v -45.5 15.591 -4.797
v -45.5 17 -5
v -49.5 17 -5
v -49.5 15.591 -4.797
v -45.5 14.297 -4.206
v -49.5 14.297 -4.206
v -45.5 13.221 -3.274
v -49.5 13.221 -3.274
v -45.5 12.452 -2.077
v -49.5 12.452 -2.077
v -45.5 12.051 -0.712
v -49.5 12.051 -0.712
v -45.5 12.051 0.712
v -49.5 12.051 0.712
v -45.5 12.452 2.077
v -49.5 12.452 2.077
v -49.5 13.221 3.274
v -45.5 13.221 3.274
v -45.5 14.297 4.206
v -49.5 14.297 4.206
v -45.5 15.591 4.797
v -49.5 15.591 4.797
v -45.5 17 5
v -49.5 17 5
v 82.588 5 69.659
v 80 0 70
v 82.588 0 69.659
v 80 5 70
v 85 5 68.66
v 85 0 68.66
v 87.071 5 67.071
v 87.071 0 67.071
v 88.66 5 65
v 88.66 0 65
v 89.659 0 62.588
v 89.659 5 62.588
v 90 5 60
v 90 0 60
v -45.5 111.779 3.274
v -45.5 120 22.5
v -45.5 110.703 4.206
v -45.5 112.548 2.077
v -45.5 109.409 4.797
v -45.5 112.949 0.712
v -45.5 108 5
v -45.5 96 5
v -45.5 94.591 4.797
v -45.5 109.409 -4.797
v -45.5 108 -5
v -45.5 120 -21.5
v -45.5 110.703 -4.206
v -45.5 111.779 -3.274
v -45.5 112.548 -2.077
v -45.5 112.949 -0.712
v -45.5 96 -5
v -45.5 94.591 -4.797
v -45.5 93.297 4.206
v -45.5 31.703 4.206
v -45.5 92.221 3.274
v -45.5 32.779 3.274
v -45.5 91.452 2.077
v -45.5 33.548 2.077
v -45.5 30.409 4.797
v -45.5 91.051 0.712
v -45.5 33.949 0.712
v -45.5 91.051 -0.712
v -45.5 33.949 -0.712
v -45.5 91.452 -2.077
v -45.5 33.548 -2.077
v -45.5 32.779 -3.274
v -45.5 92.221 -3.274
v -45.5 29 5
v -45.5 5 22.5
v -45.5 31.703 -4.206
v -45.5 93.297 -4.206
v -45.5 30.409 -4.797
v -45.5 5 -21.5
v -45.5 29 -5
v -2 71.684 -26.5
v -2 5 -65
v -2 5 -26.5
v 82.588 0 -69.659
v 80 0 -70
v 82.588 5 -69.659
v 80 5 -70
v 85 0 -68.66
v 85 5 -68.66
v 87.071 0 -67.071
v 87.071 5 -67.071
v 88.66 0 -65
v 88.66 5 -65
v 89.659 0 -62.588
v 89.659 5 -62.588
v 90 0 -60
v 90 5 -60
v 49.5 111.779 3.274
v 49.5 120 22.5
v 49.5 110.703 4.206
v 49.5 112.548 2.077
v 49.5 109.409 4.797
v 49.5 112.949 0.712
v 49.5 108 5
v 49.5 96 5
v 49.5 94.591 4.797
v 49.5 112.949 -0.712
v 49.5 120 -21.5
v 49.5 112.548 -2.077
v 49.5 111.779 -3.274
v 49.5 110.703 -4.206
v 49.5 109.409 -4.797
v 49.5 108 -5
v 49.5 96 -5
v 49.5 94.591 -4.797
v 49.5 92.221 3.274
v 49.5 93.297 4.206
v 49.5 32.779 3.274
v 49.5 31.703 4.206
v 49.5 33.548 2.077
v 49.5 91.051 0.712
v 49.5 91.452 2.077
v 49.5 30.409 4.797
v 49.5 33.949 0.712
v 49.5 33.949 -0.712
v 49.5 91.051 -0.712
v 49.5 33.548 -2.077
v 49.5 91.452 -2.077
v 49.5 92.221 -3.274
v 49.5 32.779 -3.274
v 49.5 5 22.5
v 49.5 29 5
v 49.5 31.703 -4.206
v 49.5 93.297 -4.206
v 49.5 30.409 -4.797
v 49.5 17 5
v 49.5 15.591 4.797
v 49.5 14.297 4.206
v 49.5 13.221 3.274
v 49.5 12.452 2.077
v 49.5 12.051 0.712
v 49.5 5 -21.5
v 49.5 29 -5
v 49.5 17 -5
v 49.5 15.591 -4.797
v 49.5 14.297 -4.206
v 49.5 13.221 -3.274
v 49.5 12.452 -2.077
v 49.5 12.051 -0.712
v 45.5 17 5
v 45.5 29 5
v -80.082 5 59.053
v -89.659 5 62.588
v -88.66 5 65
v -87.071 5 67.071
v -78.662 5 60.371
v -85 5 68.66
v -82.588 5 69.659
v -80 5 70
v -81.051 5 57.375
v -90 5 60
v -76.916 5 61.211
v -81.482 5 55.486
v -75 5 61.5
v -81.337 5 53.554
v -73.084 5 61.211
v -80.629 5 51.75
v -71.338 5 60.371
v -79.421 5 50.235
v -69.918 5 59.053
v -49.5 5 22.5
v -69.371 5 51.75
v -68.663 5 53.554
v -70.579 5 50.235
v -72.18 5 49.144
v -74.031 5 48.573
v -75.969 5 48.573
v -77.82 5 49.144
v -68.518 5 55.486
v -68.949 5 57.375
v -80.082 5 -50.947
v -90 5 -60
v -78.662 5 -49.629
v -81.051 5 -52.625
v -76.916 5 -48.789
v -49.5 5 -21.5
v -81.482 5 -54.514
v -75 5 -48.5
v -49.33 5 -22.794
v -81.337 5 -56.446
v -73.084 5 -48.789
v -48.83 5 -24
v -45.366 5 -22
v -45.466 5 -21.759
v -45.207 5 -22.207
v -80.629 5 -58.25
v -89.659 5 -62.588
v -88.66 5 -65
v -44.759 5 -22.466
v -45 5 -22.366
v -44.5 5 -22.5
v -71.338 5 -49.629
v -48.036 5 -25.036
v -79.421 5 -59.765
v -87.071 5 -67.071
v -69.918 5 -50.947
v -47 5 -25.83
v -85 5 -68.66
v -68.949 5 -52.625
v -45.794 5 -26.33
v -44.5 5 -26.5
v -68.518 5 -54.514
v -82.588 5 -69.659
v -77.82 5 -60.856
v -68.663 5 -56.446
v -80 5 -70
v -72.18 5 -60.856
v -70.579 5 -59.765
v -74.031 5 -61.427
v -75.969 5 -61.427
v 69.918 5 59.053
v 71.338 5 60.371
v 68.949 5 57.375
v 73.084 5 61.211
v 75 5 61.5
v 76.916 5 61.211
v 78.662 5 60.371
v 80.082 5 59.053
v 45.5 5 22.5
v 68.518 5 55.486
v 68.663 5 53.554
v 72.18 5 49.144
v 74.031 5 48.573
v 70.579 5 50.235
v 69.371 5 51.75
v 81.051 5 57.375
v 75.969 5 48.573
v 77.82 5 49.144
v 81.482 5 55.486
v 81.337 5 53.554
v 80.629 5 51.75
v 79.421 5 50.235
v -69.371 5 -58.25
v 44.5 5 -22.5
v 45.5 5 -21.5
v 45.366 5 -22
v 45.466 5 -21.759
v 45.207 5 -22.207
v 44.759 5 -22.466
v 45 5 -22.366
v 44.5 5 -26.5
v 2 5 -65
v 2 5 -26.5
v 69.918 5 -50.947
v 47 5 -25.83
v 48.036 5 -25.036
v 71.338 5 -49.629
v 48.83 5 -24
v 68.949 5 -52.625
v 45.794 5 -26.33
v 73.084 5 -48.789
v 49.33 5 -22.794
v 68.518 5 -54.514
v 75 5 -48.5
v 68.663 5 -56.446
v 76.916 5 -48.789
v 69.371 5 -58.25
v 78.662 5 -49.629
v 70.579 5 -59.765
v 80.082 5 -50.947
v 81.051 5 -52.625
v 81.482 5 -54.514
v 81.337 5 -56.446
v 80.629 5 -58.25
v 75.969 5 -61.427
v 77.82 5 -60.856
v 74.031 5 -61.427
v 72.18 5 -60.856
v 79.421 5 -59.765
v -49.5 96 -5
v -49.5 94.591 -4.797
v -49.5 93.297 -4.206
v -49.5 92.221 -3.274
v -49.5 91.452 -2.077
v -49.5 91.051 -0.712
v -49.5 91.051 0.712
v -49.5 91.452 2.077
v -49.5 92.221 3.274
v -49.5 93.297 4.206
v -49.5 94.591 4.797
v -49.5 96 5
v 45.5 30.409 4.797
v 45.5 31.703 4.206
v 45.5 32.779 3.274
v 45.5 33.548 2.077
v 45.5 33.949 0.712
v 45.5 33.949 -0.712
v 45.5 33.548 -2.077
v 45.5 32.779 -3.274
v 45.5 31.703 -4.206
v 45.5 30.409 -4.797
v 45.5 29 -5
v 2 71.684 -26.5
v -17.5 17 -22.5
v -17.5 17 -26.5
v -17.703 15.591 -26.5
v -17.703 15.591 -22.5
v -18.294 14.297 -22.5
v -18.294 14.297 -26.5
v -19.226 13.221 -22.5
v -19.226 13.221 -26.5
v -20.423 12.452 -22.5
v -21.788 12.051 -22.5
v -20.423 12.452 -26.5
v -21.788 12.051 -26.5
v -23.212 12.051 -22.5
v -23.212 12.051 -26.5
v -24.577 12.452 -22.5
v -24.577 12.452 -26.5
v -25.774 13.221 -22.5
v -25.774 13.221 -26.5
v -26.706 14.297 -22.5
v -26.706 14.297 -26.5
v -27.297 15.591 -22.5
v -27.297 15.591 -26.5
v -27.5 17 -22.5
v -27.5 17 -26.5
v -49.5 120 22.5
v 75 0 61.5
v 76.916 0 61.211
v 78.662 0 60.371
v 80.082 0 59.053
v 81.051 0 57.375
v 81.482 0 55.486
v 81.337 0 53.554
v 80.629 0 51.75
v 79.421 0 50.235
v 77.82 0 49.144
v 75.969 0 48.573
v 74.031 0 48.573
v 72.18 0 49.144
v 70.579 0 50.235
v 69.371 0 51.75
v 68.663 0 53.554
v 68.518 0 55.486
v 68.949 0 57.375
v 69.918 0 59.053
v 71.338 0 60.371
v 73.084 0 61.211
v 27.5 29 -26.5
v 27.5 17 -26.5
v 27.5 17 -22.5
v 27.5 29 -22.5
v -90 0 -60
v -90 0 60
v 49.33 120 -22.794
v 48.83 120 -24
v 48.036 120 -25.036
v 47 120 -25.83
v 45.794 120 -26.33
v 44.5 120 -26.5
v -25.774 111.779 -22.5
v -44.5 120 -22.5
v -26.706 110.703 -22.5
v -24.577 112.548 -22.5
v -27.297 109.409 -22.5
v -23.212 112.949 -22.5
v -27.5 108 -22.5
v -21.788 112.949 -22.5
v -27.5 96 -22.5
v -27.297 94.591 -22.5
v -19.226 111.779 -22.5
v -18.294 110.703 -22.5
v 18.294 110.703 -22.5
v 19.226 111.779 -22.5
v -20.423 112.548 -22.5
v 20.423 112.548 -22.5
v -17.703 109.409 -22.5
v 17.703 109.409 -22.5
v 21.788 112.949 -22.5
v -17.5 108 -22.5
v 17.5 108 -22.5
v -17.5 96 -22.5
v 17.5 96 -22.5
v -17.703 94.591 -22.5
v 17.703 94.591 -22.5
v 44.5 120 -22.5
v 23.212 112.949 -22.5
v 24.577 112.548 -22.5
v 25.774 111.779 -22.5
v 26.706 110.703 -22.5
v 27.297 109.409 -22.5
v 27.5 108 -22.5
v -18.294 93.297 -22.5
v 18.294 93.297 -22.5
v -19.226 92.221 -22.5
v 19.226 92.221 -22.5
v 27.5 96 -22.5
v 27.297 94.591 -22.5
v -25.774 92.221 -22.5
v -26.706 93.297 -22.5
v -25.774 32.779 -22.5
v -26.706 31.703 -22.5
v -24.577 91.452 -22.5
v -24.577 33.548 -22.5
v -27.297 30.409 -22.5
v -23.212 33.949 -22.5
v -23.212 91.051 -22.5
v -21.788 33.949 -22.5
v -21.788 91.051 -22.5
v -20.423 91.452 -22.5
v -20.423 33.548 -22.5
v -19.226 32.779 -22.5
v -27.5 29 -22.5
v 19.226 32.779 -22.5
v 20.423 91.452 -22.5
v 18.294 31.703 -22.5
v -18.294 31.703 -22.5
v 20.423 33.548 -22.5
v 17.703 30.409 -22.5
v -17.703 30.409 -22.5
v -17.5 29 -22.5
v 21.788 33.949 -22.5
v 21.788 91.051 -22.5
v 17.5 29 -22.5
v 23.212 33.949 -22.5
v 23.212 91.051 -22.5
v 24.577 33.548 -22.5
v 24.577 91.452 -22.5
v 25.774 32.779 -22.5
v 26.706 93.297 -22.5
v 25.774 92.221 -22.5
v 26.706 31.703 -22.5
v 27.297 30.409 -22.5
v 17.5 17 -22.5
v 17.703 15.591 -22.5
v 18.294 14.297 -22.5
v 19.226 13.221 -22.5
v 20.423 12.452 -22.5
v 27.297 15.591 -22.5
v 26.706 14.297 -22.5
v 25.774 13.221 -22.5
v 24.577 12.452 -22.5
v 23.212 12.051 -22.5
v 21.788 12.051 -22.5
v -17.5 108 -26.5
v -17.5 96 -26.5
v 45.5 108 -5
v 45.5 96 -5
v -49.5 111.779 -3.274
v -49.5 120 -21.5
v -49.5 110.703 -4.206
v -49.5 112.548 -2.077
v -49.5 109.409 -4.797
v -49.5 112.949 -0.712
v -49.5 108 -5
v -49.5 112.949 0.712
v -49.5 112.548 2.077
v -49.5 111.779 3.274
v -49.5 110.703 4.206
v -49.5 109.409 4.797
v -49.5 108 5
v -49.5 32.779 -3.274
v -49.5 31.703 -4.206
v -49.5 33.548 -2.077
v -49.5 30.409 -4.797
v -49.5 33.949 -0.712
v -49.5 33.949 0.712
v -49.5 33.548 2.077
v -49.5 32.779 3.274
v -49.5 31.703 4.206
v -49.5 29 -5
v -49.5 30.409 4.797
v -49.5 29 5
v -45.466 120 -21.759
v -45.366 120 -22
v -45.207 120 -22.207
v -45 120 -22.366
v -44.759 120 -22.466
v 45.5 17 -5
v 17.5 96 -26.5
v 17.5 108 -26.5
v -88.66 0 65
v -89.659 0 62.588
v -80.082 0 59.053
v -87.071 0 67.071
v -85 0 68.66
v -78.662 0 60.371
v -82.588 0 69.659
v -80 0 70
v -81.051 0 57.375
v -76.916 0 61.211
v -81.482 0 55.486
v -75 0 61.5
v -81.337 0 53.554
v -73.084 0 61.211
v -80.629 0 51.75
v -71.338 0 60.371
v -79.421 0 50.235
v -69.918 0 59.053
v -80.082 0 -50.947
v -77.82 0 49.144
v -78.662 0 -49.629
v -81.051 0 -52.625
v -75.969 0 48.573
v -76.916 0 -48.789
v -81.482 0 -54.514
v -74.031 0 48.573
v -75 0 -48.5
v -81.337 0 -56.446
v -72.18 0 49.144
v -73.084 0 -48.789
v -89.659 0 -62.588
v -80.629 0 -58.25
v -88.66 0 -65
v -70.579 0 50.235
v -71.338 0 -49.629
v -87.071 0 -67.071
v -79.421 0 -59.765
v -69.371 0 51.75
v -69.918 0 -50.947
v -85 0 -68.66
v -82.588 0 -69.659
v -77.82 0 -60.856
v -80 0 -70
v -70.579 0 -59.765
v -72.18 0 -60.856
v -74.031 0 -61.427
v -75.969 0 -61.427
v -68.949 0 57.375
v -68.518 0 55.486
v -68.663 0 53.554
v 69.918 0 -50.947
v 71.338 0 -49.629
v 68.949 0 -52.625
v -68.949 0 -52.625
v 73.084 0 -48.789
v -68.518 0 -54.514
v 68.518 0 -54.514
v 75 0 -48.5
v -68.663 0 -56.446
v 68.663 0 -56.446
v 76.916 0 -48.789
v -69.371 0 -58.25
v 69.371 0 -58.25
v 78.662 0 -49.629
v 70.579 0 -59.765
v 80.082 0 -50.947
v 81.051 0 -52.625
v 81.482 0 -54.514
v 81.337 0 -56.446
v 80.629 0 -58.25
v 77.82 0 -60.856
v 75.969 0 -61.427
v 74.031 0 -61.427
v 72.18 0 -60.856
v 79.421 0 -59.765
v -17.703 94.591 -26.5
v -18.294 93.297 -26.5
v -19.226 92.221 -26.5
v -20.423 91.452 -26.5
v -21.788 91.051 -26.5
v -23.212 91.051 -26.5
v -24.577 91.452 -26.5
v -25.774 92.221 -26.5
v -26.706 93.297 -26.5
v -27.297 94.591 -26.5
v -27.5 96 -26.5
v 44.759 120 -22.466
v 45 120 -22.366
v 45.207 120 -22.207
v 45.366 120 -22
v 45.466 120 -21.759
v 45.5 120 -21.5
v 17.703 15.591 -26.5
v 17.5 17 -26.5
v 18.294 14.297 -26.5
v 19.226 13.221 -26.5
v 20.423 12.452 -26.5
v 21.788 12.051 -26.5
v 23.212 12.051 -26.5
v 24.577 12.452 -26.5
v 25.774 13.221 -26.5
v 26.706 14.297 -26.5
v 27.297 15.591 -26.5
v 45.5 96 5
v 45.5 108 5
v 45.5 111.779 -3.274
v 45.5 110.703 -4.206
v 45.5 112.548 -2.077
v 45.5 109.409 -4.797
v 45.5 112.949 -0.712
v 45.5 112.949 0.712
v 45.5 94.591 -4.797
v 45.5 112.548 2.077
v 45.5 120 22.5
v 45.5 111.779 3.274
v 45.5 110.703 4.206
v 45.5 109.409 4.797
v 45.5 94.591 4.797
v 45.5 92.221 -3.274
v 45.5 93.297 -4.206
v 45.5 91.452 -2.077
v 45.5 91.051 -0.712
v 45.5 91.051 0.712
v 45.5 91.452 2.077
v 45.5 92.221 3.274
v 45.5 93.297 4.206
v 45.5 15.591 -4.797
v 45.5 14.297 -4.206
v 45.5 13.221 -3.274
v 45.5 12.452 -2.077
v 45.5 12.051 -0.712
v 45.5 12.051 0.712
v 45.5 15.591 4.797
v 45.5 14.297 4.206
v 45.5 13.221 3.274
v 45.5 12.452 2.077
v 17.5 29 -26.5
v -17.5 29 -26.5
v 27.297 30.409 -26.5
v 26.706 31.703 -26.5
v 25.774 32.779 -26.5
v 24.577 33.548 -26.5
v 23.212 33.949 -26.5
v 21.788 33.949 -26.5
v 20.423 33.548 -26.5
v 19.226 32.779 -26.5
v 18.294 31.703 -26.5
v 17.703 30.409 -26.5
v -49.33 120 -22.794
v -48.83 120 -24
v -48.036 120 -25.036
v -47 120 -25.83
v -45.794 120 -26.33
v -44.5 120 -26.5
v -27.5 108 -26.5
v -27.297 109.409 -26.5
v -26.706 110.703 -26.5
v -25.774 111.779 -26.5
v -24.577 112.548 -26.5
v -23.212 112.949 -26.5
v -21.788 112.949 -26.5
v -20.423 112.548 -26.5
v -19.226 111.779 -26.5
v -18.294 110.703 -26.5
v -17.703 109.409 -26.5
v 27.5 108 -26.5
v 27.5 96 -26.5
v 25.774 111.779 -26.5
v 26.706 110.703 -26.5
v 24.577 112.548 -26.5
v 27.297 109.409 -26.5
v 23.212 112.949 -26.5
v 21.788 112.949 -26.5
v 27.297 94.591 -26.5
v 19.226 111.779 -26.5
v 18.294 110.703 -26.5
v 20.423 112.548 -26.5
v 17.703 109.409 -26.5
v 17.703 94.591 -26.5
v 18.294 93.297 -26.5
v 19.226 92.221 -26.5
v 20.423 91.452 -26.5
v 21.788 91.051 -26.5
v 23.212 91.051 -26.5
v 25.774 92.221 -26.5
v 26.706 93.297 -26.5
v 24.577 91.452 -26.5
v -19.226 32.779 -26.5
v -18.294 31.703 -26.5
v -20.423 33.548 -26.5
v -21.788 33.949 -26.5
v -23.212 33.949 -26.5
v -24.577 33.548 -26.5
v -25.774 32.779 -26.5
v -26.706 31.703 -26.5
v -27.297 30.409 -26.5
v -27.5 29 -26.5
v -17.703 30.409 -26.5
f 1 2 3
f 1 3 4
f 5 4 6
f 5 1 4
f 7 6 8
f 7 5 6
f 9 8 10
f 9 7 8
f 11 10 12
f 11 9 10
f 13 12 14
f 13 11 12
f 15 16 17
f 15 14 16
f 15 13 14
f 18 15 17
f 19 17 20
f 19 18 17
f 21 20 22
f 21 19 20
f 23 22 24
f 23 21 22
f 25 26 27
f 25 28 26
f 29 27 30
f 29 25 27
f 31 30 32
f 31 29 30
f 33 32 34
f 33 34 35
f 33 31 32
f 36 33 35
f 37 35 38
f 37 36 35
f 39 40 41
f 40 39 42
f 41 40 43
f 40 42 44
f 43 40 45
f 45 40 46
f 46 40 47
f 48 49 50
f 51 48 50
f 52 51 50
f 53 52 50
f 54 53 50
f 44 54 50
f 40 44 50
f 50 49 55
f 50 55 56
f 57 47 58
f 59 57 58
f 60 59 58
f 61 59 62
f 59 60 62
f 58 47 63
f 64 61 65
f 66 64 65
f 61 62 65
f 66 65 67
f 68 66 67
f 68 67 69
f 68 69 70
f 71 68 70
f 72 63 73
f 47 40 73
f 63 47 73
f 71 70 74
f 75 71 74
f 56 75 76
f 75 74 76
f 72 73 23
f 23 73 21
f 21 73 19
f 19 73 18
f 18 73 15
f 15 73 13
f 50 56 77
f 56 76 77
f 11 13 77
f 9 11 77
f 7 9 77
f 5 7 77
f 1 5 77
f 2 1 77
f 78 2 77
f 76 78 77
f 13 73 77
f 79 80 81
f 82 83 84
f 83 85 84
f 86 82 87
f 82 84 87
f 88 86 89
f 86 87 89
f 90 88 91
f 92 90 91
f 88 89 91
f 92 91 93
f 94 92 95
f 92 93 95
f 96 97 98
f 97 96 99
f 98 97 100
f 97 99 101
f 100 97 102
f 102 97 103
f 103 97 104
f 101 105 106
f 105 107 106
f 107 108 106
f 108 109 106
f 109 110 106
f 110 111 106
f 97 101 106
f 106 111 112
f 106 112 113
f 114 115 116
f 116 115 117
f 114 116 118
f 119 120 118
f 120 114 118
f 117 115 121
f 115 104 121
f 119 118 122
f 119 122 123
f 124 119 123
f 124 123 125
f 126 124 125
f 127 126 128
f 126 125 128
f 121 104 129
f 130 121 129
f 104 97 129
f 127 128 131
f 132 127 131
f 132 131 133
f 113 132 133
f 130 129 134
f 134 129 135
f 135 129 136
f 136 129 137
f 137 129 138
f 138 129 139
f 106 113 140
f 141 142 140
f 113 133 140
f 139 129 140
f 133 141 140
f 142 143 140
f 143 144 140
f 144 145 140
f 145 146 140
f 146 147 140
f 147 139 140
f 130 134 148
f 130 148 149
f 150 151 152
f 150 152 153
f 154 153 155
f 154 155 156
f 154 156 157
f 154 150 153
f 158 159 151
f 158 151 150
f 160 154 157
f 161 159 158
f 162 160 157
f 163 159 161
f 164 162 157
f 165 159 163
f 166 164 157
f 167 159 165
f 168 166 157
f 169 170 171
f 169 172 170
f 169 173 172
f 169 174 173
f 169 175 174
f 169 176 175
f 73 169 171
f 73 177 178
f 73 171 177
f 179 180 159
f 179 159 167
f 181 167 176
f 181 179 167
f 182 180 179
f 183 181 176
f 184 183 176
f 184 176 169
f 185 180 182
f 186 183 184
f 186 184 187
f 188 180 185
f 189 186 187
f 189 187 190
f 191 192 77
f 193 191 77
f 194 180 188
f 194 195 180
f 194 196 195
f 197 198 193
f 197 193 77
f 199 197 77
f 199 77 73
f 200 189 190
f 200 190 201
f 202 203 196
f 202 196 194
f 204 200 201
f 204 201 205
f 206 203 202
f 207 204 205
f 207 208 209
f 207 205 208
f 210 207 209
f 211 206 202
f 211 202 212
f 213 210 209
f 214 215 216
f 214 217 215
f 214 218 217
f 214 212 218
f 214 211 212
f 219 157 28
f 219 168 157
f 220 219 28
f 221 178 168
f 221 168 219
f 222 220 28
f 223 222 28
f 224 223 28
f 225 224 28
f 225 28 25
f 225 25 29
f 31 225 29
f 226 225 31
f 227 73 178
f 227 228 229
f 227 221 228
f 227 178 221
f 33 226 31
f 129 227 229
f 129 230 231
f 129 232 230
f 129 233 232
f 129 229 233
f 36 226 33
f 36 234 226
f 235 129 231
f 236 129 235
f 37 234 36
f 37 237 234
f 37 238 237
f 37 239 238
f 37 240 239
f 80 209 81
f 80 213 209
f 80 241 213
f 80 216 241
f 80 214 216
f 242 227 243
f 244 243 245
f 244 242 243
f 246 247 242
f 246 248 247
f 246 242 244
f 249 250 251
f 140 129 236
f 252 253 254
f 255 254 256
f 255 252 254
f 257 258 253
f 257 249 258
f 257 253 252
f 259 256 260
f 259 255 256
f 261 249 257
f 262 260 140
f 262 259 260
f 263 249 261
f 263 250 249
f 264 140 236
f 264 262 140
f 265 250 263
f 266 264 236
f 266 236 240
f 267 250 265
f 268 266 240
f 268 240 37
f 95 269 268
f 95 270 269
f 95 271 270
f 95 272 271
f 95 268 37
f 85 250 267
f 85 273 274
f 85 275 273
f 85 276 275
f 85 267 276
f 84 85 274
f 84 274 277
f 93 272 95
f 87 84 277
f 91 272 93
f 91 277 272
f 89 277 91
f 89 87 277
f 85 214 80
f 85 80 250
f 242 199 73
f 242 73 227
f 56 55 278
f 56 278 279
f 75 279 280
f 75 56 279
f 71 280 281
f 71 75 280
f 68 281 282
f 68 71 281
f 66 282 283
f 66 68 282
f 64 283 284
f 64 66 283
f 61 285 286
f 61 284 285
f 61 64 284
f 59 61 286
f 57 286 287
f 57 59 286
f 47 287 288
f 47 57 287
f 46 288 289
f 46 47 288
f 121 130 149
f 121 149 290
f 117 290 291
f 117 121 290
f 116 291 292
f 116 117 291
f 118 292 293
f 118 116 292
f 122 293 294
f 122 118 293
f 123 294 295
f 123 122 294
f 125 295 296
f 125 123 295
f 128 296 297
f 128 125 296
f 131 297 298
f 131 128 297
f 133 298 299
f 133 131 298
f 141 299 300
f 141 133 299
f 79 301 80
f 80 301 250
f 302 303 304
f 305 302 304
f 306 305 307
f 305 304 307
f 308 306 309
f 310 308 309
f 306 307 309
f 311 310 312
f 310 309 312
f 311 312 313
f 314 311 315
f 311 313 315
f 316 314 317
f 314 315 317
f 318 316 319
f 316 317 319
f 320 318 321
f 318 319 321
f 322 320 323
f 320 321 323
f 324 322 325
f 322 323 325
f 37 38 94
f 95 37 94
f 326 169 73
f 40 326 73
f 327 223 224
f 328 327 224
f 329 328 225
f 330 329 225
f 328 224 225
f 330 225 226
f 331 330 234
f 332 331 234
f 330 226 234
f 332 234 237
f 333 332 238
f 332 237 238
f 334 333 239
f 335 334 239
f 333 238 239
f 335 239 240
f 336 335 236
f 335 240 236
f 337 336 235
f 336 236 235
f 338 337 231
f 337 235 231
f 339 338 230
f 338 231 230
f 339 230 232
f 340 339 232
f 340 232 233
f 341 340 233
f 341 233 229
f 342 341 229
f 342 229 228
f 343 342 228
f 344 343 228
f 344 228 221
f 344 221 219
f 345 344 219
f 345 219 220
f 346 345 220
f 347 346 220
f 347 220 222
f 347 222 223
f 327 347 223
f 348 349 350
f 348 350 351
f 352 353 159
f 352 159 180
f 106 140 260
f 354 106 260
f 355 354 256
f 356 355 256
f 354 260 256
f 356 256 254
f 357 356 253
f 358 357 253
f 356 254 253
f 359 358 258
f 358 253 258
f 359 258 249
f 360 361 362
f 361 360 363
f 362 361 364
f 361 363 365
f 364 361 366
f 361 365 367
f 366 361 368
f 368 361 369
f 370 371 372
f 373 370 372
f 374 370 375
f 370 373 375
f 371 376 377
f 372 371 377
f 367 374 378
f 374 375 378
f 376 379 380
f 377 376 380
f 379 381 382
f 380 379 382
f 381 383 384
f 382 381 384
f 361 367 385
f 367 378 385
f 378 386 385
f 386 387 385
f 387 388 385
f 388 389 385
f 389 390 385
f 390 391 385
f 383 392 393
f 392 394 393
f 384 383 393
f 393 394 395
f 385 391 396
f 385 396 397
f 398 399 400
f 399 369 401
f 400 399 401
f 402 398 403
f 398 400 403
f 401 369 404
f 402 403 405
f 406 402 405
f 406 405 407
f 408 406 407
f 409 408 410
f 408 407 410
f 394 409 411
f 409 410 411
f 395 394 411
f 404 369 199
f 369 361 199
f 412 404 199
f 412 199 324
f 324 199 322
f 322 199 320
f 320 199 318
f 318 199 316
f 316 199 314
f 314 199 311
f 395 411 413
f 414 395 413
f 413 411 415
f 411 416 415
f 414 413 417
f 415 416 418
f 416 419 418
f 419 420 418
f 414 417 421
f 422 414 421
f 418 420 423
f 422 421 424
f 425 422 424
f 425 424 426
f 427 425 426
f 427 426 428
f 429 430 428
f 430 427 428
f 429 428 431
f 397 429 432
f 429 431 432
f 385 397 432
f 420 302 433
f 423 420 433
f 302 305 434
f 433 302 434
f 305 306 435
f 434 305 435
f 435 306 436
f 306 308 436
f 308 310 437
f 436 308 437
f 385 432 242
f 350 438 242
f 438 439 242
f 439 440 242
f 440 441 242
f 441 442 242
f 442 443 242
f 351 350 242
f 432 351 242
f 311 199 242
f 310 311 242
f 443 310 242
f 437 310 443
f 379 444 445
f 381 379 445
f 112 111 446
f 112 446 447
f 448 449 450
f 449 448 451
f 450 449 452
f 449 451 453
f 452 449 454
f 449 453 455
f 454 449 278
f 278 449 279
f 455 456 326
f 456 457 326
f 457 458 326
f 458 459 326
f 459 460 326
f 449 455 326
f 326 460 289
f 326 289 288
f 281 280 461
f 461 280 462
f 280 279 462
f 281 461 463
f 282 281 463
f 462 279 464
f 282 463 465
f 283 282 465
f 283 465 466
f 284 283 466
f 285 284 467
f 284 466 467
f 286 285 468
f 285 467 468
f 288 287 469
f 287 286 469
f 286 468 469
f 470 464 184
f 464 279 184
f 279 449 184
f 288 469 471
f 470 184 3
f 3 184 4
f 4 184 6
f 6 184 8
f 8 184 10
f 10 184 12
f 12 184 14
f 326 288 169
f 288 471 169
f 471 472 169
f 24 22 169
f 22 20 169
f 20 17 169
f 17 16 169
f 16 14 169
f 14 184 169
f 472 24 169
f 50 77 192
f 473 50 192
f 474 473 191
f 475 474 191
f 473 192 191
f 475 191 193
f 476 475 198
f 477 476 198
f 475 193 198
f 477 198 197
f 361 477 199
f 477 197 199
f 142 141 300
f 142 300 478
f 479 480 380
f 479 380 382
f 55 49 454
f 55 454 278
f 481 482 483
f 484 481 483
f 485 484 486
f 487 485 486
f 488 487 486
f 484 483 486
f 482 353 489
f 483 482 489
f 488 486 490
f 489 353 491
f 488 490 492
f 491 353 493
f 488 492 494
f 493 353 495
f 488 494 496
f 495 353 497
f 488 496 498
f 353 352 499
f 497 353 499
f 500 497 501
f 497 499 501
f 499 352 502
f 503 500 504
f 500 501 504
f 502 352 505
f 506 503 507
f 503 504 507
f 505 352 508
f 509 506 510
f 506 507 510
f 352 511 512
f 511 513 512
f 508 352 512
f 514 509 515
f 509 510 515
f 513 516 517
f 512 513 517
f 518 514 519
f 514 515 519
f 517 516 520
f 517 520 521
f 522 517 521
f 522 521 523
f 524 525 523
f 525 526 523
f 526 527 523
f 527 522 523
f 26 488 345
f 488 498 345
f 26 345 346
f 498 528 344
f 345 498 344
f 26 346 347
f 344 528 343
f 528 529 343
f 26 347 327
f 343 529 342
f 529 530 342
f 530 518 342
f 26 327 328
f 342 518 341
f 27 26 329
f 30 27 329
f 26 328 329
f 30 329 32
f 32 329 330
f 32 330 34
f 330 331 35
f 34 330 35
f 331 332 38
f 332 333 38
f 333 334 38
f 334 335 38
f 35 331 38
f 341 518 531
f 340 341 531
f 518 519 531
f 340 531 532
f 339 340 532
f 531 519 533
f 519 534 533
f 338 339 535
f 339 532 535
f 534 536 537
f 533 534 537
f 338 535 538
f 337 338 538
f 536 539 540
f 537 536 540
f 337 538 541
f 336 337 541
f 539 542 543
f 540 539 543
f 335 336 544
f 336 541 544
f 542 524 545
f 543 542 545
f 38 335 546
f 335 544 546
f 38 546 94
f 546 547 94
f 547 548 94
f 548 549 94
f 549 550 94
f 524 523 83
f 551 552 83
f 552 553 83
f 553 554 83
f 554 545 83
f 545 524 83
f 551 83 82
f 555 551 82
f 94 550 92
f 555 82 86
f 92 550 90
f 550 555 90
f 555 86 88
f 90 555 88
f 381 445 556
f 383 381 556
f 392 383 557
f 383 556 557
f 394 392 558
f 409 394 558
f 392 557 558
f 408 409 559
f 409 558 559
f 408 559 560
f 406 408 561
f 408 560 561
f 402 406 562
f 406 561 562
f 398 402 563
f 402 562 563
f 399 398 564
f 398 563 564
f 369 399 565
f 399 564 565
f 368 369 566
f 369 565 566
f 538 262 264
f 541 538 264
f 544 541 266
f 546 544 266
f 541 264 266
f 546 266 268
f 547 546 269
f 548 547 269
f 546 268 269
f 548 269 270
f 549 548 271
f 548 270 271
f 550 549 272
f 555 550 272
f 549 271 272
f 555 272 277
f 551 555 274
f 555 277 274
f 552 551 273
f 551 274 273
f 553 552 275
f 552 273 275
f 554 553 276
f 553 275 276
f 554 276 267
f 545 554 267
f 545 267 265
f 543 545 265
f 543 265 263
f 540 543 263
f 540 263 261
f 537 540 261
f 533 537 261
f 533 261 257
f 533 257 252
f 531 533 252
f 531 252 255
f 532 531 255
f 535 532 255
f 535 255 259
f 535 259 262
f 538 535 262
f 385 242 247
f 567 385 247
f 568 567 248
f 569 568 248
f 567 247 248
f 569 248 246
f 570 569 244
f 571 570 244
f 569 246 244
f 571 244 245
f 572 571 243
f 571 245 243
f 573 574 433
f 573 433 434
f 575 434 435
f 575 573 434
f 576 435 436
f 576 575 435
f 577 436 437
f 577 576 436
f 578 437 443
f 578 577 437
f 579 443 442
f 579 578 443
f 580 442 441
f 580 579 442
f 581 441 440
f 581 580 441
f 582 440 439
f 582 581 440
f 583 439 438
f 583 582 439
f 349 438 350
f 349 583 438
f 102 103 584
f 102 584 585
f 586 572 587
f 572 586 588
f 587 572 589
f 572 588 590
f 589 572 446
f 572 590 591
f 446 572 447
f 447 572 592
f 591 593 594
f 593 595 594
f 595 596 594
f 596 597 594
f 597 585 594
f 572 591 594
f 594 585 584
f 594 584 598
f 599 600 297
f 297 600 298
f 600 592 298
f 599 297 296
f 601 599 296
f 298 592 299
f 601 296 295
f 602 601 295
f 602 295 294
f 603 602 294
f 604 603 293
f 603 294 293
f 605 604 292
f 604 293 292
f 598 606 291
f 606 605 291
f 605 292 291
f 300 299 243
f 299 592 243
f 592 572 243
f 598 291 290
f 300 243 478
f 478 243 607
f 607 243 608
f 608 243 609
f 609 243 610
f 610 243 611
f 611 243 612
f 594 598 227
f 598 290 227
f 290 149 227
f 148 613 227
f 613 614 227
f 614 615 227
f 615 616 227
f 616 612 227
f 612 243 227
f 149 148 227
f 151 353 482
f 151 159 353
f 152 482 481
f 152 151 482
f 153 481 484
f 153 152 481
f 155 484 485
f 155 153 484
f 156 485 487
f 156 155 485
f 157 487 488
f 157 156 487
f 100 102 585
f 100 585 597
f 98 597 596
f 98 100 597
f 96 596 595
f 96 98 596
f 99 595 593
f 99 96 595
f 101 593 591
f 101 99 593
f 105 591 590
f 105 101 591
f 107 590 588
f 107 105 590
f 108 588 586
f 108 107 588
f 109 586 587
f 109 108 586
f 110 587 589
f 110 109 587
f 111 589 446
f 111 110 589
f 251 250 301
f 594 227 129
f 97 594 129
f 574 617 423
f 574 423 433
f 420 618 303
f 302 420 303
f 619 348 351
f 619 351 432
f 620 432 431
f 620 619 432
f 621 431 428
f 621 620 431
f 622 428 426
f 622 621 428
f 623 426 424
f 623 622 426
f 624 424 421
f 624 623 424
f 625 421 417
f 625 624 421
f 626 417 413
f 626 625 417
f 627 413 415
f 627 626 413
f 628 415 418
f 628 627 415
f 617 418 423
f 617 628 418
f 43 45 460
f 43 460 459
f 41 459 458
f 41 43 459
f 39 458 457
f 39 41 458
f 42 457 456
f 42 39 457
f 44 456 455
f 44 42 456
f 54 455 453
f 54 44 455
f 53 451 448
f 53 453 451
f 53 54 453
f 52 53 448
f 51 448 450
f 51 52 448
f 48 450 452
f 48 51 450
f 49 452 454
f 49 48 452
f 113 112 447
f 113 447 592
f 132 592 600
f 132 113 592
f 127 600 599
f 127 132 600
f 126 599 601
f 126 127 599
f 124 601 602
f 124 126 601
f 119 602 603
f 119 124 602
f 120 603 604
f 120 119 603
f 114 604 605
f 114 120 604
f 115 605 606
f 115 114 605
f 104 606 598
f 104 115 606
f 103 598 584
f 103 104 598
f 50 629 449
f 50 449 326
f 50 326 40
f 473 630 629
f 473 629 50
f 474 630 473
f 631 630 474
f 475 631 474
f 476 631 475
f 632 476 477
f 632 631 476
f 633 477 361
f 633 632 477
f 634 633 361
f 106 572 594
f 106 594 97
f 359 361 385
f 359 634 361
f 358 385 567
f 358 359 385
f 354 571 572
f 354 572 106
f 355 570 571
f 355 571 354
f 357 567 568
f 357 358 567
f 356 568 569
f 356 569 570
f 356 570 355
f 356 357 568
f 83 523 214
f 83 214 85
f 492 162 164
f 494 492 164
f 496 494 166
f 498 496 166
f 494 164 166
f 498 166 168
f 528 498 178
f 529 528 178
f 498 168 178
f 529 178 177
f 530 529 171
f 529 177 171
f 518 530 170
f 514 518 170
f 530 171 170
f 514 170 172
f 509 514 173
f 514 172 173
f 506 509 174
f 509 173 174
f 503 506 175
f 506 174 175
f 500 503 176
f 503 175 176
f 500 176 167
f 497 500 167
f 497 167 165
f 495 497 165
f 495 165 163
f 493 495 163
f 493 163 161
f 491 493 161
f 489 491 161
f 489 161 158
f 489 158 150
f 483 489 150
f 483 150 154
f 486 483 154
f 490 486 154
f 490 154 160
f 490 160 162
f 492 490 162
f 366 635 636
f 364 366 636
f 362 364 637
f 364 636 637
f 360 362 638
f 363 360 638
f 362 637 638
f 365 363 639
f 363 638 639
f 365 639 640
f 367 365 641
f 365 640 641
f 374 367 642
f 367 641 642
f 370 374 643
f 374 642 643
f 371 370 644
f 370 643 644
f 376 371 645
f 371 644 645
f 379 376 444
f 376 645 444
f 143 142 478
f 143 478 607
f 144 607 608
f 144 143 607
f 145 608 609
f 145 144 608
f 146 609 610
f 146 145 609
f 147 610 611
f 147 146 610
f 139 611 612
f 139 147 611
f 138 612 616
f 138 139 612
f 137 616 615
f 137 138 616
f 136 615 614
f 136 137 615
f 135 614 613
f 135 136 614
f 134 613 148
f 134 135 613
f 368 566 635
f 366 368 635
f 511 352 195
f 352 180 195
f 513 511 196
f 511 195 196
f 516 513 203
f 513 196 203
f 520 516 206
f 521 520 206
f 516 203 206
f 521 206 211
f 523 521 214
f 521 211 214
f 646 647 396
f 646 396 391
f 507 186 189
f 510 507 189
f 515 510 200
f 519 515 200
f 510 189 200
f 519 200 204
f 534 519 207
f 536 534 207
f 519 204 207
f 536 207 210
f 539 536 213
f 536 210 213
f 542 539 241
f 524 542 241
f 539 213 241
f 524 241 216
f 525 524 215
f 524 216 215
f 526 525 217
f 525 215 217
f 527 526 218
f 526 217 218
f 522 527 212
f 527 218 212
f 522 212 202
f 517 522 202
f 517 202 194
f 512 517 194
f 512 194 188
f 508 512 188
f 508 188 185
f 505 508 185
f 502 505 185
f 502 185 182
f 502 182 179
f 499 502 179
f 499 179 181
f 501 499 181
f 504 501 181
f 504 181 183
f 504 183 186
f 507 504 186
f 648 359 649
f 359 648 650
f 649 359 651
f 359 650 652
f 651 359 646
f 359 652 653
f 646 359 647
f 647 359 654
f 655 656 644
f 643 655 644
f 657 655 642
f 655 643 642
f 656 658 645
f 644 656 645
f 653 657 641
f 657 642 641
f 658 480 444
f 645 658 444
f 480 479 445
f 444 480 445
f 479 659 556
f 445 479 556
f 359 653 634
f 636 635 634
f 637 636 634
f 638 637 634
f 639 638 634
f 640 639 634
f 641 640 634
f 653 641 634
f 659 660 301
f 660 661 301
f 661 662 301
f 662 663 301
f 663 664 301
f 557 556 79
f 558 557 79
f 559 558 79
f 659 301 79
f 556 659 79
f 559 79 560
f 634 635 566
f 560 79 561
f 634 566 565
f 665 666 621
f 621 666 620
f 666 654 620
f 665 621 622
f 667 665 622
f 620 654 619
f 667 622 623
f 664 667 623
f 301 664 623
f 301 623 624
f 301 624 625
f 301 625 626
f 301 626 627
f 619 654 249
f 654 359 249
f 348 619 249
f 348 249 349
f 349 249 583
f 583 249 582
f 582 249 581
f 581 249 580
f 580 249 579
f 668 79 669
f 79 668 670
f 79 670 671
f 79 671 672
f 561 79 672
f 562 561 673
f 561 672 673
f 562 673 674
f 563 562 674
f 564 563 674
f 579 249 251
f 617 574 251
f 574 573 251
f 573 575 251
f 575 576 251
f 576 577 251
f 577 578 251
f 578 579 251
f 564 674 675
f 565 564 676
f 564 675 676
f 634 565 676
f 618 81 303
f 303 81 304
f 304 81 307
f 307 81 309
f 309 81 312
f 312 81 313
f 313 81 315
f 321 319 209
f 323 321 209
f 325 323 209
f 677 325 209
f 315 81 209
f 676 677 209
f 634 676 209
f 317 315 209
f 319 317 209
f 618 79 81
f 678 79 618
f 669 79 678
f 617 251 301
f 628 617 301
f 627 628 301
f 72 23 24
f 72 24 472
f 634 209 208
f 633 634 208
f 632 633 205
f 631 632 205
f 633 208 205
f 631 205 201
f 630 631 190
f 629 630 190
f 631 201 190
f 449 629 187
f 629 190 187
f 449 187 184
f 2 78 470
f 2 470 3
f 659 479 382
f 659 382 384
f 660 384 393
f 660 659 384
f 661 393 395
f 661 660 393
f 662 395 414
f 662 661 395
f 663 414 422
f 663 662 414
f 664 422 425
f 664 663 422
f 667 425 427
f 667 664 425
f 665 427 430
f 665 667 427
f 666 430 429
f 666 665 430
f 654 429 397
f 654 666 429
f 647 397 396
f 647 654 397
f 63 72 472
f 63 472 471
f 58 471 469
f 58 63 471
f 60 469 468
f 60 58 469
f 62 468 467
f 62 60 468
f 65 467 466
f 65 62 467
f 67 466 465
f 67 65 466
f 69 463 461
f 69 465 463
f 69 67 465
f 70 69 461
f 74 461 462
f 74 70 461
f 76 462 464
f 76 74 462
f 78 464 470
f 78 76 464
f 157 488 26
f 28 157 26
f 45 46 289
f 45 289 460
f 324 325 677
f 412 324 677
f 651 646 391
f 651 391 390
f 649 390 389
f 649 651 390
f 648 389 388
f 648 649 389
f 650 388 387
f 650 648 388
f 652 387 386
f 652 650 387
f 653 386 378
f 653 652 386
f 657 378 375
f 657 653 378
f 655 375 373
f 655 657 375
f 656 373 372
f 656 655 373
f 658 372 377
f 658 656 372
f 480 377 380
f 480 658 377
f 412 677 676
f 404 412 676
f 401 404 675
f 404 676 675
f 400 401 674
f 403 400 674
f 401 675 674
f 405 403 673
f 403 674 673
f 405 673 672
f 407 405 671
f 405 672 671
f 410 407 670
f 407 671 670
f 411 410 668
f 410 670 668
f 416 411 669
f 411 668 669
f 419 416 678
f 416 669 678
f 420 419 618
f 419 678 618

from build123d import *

# Parameters (mm, degrees)
SKETCH_2_W          = 180
SKETCH_2_H          = 140
EXTRUDE_1_DEPTH     = 5
EXTRUDE_1_2_DEPTH   = 115
EXTRUDE_2_DEPTH     = 2
CUT_EXTRUDE_1_DEPTH = 140.5
SKETCH_6_R          = 6.5
CUT_EXTRUDE_2_DEPTH = 6
FILLET_1_R          = 10
CUT_EXTRUDE_3_REACH = 98.5


with BuildPart() as part:
    # Эскиз2 → Extrude 1 (new body)
    with BuildSketch(Plane(origin=(0, 0, 0), x_dir=(1, 0, 0), z_dir=(0, 1, 0))):
        Rectangle(SKETCH_2_W, SKETCH_2_H)
    extrude(amount=EXTRUDE_1_DEPTH)

    # Эскиз3 → Extrude 1 2 (add)
    with BuildSketch(Plane(origin=(0, 5, 0), x_dir=(1, 0, 0), z_dir=(0, 1, 0))):
        with BuildLine():
            Line((-45.5, -22.5), (-45.5, 21.5))
            ThreePointArc((-45.5, 21.5), (-45.207106781, 22.207106781), (-44.5, 22.5))
            Line((-44.5, 22.5), (44.5, 22.5))
            ThreePointArc((44.5, 22.5), (45.207106781, 22.207106781), (45.5, 21.5))
            Line((45.5, 21.5), (45.5, -22.5))
            Line((45.5, -22.5), (49.5, -22.5))
            Line((49.5, -22.5), (49.5, 21.5))
            ThreePointArc((49.5, 21.5), (48.035533906, 25.035533906), (44.5, 26.5))
            Line((44.5, 26.5), (-44.5, 26.5))
            ThreePointArc((-44.5, 26.5), (-48.035533906, 25.035533906), (-49.5, 21.5))
            Line((-49.5, 21.5), (-49.5, -22.5))
            Line((-49.5, -22.5), (-45.5, -22.5))
        make_face()
    extrude(amount=EXTRUDE_1_2_DEPTH)

    # Эскиз4 → Бобышка-Вытянуть2 (add, symmetric)
    with BuildSketch(Plane(origin=(0, 0, 0), x_dir=(0, 0, -1), z_dir=(1, 0, 0))):
        Polygon((26.5, 71.683956091), (65, 5), (26.5, 5), align=None)
    extrude(amount=EXTRUDE_2_DEPTH, both=True)

    # Эскиз5 → Вырез-Вытянуть1 (cut, through all)
    with BuildSketch(Plane(origin=(49.5, 0, 0), x_dir=(0, 0, -1), z_dir=(1, 0, 0))):
        with BuildLine():
            Line((5, 108), (5, 96))
            ThreePointArc((5, 96), (0, 91), (-5, 96))
            Line((-5, 96), (-5, 108))
            ThreePointArc((-5, 108), (0, 113), (5, 108))
        make_face()
        with BuildLine():
            Line((5, 29), (5, 17))
            ThreePointArc((5, 17), (0, 12), (-5, 17))
            Line((-5, 17), (-5, 29))
            ThreePointArc((-5, 29), (0, 34), (5, 29))
        make_face()
    extrude(amount=-CUT_EXTRUDE_1_DEPTH, mode=Mode.SUBTRACT)

    # Эскиз6 → Вырез-Вытянуть2 (cut, through all)
    with BuildSketch(Plane(origin=(0, 5, 0), x_dir=(1, 0, 0), z_dir=(0, 1, 0))):
        with Locations(Location((-75, 55, 0), (0, 0, 270))):  # turned: the seam where the file's is
            Circle(SKETCH_6_R)
        with Locations(Location((-75, -55, 0), (0, 0, 270))):  # turned: the seam where the file's is
            Circle(SKETCH_6_R)
        with Locations(Location((75, 55, 0), (0, 0, 270))):  # turned: the seam where the file's is
            Circle(SKETCH_6_R)
        with Locations(Location((75, -55, 0), (0, 0, 270))):  # turned: the seam where the file's is
            Circle(SKETCH_6_R)
    extrude(amount=-CUT_EXTRUDE_2_DEPTH, mode=Mode.SUBTRACT)

    # Скругление1
    fillet_1_edges = [part.edges().sort_by_distance(p)[0] for p in [
        (90, 2.5, 70),
        (-90, 2.5, 70),
        (-90, 2.5, -70),
        (90, 2.5, -70),
    ]]
    fillet(fillet_1_edges, radius=FILLET_1_R)

    # Эскиз8 → Вырез-Вытянуть3 (cut, up to next)
    with BuildSketch(Plane(origin=(0, 0, -26.5), x_dir=(-1, 0, 0), z_dir=(0, 0, -1)), mode=Mode.PRIVATE) as cut_extrude_3_sk1:
        with BuildLine():
            Line((-17.5, 108), (-17.5, 96))
            ThreePointArc((-17.5, 96), (-22.5, 91), (-27.5, 96))
            Line((-27.5, 96), (-27.5, 108))
            ThreePointArc((-27.5, 108), (-22.5, 113), (-17.5, 108))
        make_face()
    cut_extrude_3_tool1 = extrude(cut_extrude_3_sk1.sketch, amount=-CUT_EXTRUDE_3_REACH, mode=Mode.PRIVATE) & part.part
    add(cut_extrude_3_tool1.solids().sort_by_distance((22.5, 102, -26.5))[0], mode=Mode.SUBTRACT)
    # Эскиз8 → Вырез-Вытянуть3 (cut, up to next)
    with BuildSketch(Plane(origin=(0, 0, -26.5), x_dir=(-1, 0, 0), z_dir=(0, 0, -1)), mode=Mode.PRIVATE) as cut_extrude_3_sk2:
        with BuildLine():
            Line((-17.5, 29), (-17.5, 17))
            ThreePointArc((-17.5, 17), (-22.5, 12), (-27.5, 17))
            Line((-27.5, 17), (-27.5, 29))
            ThreePointArc((-27.5, 29), (-22.5, 34), (-17.5, 29))
        make_face()
    cut_extrude_3_tool2 = extrude(cut_extrude_3_sk2.sketch, amount=-CUT_EXTRUDE_3_REACH, mode=Mode.PRIVATE) & part.part
    add(cut_extrude_3_tool2.solids().sort_by_distance((22.5, 23, -26.5))[0], mode=Mode.SUBTRACT)
    # Эскиз8 → Вырез-Вытянуть3 (cut, up to next)
    with BuildSketch(Plane(origin=(0, 0, -26.5), x_dir=(-1, 0, 0), z_dir=(0, 0, -1)), mode=Mode.PRIVATE) as cut_extrude_3_sk3:
        with BuildLine():
            Line((17.5, 108), (17.5, 96))
            ThreePointArc((17.5, 96), (22.5, 91), (27.5, 96))
            Line((27.5, 96), (27.5, 108))
            ThreePointArc((27.5, 108), (22.5, 113), (17.5, 108))
        make_face()
    cut_extrude_3_tool3 = extrude(cut_extrude_3_sk3.sketch, amount=-CUT_EXTRUDE_3_REACH, mode=Mode.PRIVATE) & part.part
    add(cut_extrude_3_tool3.solids().sort_by_distance((-22.5, 102, -26.5))[0], mode=Mode.SUBTRACT)
    # Эскиз8 → Вырез-Вытянуть3 (cut, up to next)
    with BuildSketch(Plane(origin=(0, 0, -26.5), x_dir=(-1, 0, 0), z_dir=(0, 0, -1)), mode=Mode.PRIVATE) as cut_extrude_3_sk4:
        with BuildLine():
            Line((17.5, 29), (17.5, 17))
            ThreePointArc((17.5, 17), (22.5, 12), (27.5, 17))
            Line((27.5, 17), (27.5, 29))
            ThreePointArc((27.5, 29), (22.5, 34), (17.5, 29))
        make_face()
    cut_extrude_3_tool4 = extrude(cut_extrude_3_sk4.sketch, amount=-CUT_EXTRUDE_3_REACH, mode=Mode.PRIVATE) & part.part
    add(cut_extrude_3_tool4.solids().sort_by_distance((-22.5, 23, -26.5))[0], mode=Mode.SUBTRACT)


solid = part.part
